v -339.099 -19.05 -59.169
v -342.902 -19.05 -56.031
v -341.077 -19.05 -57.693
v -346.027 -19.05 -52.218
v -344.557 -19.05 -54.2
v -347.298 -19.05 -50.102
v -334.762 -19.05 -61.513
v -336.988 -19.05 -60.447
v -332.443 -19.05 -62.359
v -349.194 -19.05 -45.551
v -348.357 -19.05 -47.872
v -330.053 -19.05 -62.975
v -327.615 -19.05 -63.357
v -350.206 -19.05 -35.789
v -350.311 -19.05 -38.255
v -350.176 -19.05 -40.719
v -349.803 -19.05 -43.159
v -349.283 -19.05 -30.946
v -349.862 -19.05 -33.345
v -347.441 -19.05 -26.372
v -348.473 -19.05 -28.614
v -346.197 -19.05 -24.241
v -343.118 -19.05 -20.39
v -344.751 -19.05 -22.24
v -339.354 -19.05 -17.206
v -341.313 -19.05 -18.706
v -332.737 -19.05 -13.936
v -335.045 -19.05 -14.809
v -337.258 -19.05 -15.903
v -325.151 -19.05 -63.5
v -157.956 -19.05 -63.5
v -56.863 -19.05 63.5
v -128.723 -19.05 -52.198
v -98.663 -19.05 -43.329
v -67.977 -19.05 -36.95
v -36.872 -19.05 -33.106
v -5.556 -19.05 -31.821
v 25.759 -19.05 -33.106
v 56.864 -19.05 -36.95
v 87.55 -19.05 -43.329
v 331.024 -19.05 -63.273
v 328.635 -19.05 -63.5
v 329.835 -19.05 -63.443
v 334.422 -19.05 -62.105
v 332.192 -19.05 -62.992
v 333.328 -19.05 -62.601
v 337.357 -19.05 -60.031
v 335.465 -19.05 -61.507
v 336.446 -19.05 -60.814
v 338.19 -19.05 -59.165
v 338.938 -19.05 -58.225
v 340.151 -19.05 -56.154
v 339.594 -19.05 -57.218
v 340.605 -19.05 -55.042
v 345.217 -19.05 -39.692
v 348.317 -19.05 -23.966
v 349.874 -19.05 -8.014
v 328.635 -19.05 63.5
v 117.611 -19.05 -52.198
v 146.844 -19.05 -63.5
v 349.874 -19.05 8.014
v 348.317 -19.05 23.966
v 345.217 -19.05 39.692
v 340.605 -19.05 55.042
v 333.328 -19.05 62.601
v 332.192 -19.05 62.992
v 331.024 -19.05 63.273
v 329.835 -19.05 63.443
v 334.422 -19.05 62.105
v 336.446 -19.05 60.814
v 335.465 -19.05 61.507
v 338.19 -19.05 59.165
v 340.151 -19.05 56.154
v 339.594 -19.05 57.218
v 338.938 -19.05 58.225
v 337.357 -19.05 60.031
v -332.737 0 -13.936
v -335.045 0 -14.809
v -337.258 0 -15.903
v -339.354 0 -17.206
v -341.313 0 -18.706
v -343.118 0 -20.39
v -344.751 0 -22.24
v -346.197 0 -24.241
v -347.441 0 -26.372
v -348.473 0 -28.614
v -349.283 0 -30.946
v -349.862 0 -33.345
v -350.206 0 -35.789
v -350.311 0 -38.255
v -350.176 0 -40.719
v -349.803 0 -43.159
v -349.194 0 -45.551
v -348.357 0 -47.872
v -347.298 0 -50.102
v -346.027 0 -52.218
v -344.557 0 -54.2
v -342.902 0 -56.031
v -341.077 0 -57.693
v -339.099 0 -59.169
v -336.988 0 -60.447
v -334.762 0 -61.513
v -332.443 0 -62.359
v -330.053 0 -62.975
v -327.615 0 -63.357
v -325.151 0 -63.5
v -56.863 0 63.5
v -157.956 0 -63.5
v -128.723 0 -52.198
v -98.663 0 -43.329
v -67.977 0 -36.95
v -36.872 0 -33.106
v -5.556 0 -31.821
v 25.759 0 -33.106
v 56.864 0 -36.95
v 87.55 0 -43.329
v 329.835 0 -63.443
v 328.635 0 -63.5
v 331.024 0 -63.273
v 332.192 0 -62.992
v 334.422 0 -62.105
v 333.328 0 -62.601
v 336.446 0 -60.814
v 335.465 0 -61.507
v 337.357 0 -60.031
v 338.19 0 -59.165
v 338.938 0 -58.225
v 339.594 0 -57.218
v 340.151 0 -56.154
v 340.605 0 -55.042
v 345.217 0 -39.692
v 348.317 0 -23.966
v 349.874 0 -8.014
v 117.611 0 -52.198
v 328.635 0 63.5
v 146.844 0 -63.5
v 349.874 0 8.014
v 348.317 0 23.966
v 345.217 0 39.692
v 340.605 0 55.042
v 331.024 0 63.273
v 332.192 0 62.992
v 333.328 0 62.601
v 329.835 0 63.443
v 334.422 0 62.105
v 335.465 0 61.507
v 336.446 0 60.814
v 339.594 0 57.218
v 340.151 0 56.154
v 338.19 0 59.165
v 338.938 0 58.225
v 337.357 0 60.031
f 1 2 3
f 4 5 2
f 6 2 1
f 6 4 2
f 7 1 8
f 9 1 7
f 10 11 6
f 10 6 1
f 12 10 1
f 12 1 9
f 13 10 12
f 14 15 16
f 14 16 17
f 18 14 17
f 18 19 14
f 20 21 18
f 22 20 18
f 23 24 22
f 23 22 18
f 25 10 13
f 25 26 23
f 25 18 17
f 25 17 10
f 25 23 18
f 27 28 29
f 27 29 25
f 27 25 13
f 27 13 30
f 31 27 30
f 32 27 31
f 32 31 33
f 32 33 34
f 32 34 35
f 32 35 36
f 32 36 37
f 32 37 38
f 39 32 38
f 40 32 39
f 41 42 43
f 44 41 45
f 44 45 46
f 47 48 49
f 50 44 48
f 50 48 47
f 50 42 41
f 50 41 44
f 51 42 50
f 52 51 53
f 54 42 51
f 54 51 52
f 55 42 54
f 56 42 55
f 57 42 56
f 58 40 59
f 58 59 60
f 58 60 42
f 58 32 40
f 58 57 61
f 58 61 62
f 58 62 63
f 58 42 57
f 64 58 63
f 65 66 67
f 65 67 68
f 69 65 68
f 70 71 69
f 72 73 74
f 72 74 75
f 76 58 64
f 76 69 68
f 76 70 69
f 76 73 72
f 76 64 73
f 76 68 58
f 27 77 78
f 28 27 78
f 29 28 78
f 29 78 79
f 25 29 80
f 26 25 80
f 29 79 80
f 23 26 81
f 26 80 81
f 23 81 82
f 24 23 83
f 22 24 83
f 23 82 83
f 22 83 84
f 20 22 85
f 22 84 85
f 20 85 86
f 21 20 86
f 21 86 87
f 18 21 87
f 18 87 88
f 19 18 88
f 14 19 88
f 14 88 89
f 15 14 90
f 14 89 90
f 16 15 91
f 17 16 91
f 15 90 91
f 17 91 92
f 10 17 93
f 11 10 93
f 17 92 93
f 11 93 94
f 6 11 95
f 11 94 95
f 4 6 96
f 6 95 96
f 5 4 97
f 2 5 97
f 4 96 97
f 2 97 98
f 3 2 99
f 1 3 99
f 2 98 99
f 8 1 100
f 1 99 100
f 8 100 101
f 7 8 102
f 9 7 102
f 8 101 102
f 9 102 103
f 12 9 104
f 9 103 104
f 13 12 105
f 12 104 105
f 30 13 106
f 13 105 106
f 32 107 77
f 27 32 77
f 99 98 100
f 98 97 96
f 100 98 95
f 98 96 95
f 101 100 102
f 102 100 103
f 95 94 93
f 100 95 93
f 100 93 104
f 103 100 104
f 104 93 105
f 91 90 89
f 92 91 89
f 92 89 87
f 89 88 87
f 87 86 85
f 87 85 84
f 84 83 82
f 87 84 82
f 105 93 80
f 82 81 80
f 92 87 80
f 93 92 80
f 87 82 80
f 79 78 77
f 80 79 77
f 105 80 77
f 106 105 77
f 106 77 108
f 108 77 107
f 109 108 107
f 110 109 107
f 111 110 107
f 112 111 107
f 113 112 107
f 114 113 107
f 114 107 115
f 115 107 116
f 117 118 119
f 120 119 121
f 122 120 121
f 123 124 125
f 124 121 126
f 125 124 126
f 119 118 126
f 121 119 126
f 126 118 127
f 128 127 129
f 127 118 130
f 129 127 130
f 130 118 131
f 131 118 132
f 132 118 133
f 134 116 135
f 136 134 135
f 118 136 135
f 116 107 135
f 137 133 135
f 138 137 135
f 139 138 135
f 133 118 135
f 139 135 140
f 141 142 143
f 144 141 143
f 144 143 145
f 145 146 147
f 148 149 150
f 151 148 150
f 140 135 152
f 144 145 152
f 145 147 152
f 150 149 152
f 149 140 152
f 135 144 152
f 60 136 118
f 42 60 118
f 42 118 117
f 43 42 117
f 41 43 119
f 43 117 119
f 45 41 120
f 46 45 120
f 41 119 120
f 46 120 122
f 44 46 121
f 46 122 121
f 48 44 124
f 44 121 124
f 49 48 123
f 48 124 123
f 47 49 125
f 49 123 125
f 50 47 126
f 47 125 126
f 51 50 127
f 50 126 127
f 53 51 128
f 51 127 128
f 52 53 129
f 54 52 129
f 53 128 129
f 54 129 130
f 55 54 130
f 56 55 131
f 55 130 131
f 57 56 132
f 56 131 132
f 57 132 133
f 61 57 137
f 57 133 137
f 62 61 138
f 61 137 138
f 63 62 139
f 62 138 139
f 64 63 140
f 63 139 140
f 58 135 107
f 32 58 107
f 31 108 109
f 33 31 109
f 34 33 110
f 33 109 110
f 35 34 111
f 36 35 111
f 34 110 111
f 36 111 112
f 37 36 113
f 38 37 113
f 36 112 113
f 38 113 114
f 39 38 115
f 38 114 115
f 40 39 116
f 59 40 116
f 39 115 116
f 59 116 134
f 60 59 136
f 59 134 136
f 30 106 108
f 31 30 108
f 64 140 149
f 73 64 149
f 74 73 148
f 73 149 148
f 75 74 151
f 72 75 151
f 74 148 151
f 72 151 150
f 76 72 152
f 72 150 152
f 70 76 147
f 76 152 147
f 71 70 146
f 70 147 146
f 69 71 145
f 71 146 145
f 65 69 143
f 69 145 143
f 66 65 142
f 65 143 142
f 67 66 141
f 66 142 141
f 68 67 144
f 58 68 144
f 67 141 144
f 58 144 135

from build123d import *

# Parameters (mm, degrees)
F1_DEPTH = 19.05


with BuildPart() as f1:
    # F0 (on Front) → F1 (new body)
    with BuildSketch(Plane.XZ):
        with BuildLine():
            Line((328.634582, 63.5), (-56.863403, 63.5))
            Line((-56.863403, 63.5), (-332.736589, -13.935924))
            ThreePointArc((-332.736589, -13.935924), (-350.018995, -41.943488), (-325.150903, -63.5))
            Line((-325.150903, -63.5), (-157.95625, -63.5))
            ThreePointArc((-157.95625, -63.5), (-5.55625, -31.82137), (146.84375, -63.5))
            Line((146.84375, -63.5), (328.634582, -63.5))
            ThreePointArc((328.634582, -63.5), (335.963356, -61.172033), (340.605336, -55.041584))
            ThreePointArc((340.605336, -55.041584), (350.068505, 0), (340.605336, 55.041584))
            ThreePointArc((340.605336, 55.041584), (335.963356, 61.172033), (328.634582, 63.5))
        make_face()
    extrude(amount=F1_DEPTH)


solid = f1.part
